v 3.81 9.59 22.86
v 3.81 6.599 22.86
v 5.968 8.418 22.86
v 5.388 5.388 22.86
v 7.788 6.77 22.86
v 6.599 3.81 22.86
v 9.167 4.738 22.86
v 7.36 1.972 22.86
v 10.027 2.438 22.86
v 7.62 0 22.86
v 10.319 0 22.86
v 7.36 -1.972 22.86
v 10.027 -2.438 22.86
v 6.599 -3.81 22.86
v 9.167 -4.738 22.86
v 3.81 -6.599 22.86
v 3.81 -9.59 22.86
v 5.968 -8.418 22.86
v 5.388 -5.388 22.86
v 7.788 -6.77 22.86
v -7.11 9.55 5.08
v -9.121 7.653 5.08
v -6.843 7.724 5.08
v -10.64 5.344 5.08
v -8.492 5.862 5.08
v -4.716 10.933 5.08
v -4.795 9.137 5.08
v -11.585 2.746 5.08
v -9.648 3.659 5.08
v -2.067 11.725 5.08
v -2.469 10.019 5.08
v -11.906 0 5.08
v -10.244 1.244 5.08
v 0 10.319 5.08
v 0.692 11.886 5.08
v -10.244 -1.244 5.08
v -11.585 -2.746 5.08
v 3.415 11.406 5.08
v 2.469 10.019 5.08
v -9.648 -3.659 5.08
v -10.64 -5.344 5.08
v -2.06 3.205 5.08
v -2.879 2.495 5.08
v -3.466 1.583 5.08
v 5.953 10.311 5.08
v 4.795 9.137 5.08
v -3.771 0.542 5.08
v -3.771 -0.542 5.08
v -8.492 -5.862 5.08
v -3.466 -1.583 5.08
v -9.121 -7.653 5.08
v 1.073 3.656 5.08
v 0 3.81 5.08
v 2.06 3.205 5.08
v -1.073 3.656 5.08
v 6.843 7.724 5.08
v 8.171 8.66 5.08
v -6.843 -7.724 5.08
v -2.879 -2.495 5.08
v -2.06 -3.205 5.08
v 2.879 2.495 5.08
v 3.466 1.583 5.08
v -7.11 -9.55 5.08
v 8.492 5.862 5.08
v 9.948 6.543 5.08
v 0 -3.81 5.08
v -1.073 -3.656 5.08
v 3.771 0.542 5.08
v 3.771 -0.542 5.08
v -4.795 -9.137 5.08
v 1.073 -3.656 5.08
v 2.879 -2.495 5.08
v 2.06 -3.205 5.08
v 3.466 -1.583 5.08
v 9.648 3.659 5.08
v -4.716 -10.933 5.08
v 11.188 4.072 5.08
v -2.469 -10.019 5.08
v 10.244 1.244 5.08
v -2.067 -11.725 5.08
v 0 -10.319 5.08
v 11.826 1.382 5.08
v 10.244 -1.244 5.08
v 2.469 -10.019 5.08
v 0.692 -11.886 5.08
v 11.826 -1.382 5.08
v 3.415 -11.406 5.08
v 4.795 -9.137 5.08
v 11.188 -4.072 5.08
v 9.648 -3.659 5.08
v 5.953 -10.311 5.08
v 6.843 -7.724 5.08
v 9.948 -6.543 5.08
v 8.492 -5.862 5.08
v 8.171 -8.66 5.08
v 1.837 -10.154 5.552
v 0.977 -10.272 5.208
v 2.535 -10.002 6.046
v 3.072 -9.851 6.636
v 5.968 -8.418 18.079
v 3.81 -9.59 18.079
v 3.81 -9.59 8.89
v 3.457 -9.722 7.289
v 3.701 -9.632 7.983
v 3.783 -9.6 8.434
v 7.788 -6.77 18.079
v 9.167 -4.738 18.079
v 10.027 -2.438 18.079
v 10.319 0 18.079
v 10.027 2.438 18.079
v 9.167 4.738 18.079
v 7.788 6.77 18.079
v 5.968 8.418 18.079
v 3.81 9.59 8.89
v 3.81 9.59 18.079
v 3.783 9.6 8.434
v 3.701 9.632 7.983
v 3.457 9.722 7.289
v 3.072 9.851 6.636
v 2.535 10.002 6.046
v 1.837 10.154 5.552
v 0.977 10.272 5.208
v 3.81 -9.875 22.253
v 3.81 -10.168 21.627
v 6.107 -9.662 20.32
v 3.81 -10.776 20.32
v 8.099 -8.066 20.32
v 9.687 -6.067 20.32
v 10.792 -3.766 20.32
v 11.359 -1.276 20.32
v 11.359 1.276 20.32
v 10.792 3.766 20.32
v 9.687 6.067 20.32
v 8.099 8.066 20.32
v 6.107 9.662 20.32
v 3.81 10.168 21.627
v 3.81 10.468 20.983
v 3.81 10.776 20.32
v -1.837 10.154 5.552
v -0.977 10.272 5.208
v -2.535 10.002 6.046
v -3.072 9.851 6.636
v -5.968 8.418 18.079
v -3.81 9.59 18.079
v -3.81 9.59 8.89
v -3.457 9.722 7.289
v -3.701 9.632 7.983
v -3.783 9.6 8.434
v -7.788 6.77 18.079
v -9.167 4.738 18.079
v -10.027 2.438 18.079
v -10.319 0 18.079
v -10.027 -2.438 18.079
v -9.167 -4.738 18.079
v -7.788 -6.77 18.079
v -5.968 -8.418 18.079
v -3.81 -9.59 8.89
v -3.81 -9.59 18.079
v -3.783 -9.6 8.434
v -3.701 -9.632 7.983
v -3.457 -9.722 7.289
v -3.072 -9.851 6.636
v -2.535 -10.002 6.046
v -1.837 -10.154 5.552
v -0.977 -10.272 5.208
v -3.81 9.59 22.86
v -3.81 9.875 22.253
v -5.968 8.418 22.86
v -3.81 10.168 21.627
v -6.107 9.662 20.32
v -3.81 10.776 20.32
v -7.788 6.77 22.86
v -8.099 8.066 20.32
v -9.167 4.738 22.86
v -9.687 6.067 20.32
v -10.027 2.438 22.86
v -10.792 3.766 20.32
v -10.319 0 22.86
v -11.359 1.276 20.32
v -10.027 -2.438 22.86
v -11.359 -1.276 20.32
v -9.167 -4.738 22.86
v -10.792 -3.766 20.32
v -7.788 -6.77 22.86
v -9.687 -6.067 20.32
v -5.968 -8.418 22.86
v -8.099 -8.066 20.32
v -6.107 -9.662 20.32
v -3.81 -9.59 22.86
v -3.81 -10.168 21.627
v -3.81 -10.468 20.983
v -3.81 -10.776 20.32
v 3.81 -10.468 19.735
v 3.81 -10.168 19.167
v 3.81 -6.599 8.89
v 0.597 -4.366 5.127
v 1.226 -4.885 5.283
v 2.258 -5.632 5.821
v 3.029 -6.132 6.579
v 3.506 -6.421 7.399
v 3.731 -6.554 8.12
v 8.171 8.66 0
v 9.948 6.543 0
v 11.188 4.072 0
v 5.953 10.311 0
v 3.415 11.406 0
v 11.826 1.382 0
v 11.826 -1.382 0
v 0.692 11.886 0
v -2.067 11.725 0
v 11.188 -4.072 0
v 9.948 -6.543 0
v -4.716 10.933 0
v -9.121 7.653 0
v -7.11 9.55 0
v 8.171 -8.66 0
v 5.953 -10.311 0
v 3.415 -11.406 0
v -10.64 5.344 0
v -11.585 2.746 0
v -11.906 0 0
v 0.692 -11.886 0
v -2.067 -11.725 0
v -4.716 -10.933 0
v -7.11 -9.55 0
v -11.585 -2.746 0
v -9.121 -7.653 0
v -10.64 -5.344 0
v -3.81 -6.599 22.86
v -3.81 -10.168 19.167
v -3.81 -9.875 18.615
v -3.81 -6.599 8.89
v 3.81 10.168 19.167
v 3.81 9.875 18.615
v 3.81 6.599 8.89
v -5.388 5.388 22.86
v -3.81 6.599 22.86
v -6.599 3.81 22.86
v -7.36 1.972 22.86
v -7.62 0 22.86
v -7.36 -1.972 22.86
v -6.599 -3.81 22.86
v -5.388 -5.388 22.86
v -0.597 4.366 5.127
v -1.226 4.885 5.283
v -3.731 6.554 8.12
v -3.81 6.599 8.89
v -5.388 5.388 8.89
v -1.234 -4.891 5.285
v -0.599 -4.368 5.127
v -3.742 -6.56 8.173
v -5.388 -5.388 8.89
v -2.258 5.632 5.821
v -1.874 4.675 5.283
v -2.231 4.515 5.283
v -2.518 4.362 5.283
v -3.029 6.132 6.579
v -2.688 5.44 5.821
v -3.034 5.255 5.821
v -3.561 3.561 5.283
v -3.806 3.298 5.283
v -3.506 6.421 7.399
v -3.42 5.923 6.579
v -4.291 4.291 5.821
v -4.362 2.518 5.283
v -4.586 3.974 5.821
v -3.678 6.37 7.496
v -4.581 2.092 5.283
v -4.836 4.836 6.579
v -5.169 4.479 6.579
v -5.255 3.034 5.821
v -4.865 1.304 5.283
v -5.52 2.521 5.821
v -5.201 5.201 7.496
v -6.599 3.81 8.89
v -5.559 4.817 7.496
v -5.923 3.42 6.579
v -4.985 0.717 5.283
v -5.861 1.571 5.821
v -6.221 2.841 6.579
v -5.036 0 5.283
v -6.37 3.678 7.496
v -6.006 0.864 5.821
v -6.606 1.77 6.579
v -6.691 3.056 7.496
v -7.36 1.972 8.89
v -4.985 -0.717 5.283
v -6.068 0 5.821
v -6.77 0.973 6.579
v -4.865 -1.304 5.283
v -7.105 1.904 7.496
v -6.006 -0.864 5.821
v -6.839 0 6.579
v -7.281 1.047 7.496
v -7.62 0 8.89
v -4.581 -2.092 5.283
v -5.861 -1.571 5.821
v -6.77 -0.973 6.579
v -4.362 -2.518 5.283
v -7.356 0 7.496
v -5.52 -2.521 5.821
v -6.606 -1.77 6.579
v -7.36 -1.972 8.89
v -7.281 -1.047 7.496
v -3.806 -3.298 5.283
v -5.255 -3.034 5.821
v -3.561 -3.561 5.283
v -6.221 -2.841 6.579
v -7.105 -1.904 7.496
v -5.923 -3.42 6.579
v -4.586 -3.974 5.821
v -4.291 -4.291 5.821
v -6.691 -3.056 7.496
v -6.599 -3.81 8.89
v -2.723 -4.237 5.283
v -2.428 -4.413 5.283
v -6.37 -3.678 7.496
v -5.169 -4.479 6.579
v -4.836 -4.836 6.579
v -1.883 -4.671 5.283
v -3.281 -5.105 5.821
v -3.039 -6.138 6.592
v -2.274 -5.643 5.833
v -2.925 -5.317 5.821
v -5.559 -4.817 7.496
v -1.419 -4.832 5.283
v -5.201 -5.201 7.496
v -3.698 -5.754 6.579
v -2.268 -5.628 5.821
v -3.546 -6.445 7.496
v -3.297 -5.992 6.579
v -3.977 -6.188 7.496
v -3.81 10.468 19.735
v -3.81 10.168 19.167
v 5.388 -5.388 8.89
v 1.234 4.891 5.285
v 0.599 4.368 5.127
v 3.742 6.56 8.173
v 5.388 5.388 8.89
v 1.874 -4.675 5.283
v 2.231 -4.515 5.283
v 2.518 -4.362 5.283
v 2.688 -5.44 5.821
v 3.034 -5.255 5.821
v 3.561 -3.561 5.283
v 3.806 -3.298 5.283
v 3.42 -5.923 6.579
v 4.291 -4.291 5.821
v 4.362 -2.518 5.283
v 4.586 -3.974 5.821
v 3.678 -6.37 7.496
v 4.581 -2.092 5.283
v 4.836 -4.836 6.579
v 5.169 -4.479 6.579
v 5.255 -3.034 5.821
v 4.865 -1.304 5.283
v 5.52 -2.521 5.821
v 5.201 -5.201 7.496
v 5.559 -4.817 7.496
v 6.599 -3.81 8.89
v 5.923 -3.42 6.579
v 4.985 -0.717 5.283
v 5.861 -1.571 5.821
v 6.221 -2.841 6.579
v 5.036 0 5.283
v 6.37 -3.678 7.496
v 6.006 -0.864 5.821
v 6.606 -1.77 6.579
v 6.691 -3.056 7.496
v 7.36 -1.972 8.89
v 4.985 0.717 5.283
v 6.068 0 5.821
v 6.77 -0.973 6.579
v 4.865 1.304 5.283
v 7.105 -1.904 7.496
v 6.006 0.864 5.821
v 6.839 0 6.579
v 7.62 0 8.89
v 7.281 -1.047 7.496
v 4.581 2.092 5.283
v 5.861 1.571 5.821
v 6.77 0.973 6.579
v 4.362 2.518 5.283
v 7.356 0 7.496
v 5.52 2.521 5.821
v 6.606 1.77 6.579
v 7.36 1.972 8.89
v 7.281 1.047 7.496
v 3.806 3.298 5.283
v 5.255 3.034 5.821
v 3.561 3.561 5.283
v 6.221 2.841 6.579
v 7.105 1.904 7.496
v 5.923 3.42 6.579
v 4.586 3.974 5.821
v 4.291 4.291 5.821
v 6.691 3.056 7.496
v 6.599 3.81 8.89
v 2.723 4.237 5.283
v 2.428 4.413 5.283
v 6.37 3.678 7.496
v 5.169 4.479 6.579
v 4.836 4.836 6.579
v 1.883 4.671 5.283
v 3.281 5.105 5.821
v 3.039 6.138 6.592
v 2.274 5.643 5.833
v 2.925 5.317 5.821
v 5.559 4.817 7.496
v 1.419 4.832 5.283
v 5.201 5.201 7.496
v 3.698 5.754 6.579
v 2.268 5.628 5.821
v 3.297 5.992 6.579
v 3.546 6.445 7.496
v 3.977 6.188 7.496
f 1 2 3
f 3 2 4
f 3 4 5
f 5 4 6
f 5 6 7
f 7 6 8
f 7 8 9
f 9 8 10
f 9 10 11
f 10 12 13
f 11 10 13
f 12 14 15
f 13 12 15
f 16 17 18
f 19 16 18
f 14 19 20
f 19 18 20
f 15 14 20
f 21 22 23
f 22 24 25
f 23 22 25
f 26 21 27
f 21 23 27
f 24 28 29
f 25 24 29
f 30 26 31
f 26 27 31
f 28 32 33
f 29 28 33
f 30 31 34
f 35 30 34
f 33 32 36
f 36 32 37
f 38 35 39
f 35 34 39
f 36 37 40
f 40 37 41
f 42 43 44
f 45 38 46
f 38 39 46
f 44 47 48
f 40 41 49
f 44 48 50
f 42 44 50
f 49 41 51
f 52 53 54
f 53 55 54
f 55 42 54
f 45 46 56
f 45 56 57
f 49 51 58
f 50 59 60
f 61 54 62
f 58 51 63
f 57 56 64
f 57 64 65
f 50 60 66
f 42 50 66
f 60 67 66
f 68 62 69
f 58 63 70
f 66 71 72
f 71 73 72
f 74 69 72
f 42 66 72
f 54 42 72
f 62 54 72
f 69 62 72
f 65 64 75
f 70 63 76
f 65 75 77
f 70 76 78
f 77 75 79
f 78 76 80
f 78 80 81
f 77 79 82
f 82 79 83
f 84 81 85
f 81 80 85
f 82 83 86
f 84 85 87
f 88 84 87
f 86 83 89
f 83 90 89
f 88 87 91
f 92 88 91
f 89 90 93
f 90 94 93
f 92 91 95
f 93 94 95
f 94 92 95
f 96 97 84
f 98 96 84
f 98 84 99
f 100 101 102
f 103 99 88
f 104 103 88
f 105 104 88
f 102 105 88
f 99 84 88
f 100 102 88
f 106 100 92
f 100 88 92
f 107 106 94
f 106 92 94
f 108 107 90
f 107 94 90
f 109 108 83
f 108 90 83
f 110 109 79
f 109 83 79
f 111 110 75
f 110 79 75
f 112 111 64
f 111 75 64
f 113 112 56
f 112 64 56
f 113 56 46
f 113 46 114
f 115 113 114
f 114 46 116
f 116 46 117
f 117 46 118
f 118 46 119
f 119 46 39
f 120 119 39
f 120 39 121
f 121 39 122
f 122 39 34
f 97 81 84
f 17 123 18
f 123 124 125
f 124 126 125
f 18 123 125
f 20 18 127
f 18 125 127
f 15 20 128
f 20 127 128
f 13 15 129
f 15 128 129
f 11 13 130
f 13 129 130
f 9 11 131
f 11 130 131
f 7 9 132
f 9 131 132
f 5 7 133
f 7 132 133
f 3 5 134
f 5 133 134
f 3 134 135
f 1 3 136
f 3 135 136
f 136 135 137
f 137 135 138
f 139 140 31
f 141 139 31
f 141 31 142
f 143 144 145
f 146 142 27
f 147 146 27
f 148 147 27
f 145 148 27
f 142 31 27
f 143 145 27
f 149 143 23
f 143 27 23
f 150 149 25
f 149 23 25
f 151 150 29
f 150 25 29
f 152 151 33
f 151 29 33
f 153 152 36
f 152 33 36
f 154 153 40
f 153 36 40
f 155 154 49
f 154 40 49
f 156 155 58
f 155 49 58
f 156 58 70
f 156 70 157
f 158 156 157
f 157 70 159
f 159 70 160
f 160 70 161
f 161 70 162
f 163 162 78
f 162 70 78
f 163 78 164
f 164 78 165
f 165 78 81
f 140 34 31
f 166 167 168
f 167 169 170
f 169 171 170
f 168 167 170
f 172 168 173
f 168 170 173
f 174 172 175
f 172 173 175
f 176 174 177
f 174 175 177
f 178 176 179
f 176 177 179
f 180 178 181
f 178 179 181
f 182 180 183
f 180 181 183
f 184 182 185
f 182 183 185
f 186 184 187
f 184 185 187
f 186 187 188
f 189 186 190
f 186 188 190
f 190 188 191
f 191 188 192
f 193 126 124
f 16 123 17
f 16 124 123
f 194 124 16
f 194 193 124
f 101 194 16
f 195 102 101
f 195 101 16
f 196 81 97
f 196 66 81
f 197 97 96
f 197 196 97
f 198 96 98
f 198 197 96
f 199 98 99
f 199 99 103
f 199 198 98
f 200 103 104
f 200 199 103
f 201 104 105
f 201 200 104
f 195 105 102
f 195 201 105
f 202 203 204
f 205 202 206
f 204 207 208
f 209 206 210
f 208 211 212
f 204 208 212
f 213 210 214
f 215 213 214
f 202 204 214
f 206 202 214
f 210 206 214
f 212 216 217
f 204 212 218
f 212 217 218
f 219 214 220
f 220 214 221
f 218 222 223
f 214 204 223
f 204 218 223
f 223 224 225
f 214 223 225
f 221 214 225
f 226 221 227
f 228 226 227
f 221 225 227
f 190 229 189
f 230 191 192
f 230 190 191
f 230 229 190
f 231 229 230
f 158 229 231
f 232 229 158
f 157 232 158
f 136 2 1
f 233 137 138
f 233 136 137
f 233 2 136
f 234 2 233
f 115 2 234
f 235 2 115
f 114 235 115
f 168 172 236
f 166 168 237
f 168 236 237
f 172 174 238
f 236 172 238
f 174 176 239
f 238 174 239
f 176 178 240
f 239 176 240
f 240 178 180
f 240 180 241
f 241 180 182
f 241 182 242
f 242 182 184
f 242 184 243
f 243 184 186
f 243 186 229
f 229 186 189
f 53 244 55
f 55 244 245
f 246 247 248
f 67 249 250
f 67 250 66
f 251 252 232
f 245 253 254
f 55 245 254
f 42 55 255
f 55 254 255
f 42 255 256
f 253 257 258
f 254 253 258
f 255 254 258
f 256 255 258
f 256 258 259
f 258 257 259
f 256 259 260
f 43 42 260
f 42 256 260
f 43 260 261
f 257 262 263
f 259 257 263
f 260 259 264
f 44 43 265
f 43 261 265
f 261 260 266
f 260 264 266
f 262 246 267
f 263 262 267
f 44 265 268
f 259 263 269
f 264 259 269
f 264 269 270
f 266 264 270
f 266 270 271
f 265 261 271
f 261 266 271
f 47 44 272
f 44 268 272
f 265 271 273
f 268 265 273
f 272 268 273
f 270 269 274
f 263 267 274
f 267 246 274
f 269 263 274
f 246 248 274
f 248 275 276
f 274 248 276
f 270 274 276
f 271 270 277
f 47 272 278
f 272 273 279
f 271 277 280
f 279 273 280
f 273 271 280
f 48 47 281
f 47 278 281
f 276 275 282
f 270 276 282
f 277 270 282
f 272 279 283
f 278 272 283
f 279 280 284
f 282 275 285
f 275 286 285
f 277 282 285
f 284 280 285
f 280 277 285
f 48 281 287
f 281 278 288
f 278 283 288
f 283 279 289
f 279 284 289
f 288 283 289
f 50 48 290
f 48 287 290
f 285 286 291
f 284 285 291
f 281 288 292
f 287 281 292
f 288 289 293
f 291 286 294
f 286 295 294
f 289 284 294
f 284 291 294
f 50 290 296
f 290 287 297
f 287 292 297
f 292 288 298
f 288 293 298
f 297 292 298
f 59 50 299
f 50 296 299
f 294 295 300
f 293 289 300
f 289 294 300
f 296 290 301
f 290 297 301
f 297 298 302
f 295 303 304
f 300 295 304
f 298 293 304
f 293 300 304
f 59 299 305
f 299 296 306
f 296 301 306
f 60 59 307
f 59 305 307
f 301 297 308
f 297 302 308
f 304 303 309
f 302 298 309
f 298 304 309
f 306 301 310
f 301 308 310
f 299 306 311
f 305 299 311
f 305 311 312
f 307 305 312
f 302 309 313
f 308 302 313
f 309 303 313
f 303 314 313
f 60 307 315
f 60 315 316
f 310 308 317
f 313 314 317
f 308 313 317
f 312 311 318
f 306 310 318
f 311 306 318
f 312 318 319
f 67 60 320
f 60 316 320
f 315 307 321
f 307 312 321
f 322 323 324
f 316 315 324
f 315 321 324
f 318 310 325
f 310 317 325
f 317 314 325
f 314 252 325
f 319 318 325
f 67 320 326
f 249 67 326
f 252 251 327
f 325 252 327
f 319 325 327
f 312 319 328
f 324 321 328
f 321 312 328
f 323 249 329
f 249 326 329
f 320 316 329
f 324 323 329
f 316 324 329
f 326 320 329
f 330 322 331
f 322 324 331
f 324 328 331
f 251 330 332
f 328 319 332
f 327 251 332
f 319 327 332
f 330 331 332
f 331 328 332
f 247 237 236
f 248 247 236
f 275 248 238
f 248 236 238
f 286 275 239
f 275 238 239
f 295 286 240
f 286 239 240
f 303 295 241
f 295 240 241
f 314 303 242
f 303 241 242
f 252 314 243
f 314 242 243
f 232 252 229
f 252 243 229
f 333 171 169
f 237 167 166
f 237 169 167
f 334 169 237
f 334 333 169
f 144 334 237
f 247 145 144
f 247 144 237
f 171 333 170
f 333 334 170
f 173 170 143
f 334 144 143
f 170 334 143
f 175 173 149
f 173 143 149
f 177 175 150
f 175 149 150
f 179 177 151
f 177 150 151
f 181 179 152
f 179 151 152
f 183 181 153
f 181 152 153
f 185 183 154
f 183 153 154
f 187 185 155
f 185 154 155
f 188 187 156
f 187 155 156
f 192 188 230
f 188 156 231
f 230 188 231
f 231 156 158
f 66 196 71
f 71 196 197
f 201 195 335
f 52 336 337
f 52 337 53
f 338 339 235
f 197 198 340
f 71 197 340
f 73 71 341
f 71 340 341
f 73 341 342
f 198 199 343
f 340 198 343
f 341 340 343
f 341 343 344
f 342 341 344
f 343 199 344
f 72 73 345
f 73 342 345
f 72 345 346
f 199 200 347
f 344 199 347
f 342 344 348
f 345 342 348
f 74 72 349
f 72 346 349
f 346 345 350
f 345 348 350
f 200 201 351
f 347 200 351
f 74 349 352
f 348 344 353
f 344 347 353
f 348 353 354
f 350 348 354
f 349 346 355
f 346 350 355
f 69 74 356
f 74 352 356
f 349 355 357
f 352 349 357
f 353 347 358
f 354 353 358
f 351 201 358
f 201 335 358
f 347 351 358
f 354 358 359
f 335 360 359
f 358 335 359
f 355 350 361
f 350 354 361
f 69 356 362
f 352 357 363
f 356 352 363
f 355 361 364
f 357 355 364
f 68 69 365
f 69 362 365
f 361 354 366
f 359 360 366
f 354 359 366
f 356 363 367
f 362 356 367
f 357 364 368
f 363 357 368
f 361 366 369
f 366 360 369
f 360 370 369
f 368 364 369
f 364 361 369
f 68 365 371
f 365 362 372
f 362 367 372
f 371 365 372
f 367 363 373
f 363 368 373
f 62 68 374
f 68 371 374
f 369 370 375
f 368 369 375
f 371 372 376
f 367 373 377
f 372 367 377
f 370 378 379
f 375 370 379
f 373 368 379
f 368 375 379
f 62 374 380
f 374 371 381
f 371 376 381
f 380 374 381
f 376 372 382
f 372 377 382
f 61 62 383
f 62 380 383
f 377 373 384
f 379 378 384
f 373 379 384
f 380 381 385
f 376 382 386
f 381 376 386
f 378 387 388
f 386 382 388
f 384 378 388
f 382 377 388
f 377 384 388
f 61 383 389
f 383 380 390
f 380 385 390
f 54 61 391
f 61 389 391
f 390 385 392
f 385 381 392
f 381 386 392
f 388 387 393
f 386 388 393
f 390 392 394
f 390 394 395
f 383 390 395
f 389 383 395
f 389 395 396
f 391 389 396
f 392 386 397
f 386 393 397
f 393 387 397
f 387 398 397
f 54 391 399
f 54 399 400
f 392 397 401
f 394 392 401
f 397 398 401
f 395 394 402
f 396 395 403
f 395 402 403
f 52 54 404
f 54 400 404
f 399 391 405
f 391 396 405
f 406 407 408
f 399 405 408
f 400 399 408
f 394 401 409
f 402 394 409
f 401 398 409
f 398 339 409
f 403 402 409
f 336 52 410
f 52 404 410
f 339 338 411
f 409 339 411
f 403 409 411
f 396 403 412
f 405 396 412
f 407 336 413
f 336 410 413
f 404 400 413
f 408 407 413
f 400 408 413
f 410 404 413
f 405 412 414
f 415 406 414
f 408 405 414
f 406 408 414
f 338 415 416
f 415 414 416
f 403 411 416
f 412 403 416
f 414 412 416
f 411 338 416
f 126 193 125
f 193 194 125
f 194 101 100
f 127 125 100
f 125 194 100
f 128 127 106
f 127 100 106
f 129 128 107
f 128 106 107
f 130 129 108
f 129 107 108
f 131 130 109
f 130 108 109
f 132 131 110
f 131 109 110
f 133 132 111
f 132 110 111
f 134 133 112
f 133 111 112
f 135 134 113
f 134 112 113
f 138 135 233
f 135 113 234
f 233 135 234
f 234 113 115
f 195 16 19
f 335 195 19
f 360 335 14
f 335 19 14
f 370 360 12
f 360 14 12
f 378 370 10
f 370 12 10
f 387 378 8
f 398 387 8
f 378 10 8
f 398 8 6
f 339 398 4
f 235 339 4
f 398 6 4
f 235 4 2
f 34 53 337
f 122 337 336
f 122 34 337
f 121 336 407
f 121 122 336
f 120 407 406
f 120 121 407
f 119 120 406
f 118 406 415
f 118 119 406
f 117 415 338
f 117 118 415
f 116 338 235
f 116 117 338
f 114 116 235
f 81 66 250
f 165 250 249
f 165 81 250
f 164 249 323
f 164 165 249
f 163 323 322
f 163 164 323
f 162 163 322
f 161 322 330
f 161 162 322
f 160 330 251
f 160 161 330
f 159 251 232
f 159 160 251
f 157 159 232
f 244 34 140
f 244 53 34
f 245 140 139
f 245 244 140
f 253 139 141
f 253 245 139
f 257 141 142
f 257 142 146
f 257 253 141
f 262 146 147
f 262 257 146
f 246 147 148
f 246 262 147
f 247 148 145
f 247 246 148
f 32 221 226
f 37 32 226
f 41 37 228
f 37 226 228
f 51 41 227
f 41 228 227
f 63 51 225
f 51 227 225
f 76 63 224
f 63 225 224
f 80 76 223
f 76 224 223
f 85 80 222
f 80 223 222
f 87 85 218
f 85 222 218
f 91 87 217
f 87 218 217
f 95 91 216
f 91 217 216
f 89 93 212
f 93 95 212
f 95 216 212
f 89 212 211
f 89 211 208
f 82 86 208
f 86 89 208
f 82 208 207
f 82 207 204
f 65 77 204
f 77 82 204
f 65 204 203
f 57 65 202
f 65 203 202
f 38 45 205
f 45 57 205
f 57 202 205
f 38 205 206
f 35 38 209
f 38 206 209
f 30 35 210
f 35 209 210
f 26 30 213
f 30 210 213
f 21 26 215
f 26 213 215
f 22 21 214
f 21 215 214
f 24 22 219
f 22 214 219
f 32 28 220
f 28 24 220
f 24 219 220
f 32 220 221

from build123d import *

# Parameters (mm, degrees)
F3_R     = 7.62
F4_DEPTH = 17.78
F6_DEPTH = 25.4
F7_R     = 3.80999


# Not quite as in the source:
# - a fillet or chamfer is up to 0.001 mm smaller than in the source, because OpenCascade refuses the exact size


with BuildPart() as f2:
    # F0 (on Front) → F2 (revolve)
    with BuildSketch(Plane.XZ):
        Polygon((-11.90625, 5.08), (-11.90625, 0), (0, 0), (0, 22.86), (-10.31875, 22.86), (-11.43, 20.32), (-10.31875, 18.0785163727), (-10.31875, 5.08), align=None)
    revolve(axis=Axis((0, 0, 7.382690208), (0, 0, 1)))

    # F3 (on face) → F4 (cut, through all)
    with BuildSketch(Plane.XY.offset(22.86)):
        Circle(F3_R)
    extrude(amount=-F4_DEPTH, mode=Mode.SUBTRACT)

    # F5 (on face) → F6 (cut)
    with BuildSketch(Plane.XY.offset(5.08)):
        Polygon((3.81, 14.0309315175), (-3.81, 14.0309315175), (-3.81, 3.81), (-3.81, -15.0898629799), (3.81, -15.0898629799), (3.81, 3.81), align=None)
    extrude(amount=F6_DEPTH, mode=Mode.SUBTRACT)

    # F7 (radius 3.81 in the source; OpenCascade refuses exactly that, so slightly less here)
    f7_edges = [f2.edges().sort_by_distance(p)[0] for p in [
        (-7.62, 0, 5.08),
        (7.62, 0, 5.08),
        (3.81, 8.094359, 5.08),
        (3.81, -8.094359, 5.08),
        (-3.81, -8.094359, 5.08),
        (-3.81, 8.094359, 5.08),
    ]]
    fillet(f7_edges, radius=F7_R)


solid = f2.part
